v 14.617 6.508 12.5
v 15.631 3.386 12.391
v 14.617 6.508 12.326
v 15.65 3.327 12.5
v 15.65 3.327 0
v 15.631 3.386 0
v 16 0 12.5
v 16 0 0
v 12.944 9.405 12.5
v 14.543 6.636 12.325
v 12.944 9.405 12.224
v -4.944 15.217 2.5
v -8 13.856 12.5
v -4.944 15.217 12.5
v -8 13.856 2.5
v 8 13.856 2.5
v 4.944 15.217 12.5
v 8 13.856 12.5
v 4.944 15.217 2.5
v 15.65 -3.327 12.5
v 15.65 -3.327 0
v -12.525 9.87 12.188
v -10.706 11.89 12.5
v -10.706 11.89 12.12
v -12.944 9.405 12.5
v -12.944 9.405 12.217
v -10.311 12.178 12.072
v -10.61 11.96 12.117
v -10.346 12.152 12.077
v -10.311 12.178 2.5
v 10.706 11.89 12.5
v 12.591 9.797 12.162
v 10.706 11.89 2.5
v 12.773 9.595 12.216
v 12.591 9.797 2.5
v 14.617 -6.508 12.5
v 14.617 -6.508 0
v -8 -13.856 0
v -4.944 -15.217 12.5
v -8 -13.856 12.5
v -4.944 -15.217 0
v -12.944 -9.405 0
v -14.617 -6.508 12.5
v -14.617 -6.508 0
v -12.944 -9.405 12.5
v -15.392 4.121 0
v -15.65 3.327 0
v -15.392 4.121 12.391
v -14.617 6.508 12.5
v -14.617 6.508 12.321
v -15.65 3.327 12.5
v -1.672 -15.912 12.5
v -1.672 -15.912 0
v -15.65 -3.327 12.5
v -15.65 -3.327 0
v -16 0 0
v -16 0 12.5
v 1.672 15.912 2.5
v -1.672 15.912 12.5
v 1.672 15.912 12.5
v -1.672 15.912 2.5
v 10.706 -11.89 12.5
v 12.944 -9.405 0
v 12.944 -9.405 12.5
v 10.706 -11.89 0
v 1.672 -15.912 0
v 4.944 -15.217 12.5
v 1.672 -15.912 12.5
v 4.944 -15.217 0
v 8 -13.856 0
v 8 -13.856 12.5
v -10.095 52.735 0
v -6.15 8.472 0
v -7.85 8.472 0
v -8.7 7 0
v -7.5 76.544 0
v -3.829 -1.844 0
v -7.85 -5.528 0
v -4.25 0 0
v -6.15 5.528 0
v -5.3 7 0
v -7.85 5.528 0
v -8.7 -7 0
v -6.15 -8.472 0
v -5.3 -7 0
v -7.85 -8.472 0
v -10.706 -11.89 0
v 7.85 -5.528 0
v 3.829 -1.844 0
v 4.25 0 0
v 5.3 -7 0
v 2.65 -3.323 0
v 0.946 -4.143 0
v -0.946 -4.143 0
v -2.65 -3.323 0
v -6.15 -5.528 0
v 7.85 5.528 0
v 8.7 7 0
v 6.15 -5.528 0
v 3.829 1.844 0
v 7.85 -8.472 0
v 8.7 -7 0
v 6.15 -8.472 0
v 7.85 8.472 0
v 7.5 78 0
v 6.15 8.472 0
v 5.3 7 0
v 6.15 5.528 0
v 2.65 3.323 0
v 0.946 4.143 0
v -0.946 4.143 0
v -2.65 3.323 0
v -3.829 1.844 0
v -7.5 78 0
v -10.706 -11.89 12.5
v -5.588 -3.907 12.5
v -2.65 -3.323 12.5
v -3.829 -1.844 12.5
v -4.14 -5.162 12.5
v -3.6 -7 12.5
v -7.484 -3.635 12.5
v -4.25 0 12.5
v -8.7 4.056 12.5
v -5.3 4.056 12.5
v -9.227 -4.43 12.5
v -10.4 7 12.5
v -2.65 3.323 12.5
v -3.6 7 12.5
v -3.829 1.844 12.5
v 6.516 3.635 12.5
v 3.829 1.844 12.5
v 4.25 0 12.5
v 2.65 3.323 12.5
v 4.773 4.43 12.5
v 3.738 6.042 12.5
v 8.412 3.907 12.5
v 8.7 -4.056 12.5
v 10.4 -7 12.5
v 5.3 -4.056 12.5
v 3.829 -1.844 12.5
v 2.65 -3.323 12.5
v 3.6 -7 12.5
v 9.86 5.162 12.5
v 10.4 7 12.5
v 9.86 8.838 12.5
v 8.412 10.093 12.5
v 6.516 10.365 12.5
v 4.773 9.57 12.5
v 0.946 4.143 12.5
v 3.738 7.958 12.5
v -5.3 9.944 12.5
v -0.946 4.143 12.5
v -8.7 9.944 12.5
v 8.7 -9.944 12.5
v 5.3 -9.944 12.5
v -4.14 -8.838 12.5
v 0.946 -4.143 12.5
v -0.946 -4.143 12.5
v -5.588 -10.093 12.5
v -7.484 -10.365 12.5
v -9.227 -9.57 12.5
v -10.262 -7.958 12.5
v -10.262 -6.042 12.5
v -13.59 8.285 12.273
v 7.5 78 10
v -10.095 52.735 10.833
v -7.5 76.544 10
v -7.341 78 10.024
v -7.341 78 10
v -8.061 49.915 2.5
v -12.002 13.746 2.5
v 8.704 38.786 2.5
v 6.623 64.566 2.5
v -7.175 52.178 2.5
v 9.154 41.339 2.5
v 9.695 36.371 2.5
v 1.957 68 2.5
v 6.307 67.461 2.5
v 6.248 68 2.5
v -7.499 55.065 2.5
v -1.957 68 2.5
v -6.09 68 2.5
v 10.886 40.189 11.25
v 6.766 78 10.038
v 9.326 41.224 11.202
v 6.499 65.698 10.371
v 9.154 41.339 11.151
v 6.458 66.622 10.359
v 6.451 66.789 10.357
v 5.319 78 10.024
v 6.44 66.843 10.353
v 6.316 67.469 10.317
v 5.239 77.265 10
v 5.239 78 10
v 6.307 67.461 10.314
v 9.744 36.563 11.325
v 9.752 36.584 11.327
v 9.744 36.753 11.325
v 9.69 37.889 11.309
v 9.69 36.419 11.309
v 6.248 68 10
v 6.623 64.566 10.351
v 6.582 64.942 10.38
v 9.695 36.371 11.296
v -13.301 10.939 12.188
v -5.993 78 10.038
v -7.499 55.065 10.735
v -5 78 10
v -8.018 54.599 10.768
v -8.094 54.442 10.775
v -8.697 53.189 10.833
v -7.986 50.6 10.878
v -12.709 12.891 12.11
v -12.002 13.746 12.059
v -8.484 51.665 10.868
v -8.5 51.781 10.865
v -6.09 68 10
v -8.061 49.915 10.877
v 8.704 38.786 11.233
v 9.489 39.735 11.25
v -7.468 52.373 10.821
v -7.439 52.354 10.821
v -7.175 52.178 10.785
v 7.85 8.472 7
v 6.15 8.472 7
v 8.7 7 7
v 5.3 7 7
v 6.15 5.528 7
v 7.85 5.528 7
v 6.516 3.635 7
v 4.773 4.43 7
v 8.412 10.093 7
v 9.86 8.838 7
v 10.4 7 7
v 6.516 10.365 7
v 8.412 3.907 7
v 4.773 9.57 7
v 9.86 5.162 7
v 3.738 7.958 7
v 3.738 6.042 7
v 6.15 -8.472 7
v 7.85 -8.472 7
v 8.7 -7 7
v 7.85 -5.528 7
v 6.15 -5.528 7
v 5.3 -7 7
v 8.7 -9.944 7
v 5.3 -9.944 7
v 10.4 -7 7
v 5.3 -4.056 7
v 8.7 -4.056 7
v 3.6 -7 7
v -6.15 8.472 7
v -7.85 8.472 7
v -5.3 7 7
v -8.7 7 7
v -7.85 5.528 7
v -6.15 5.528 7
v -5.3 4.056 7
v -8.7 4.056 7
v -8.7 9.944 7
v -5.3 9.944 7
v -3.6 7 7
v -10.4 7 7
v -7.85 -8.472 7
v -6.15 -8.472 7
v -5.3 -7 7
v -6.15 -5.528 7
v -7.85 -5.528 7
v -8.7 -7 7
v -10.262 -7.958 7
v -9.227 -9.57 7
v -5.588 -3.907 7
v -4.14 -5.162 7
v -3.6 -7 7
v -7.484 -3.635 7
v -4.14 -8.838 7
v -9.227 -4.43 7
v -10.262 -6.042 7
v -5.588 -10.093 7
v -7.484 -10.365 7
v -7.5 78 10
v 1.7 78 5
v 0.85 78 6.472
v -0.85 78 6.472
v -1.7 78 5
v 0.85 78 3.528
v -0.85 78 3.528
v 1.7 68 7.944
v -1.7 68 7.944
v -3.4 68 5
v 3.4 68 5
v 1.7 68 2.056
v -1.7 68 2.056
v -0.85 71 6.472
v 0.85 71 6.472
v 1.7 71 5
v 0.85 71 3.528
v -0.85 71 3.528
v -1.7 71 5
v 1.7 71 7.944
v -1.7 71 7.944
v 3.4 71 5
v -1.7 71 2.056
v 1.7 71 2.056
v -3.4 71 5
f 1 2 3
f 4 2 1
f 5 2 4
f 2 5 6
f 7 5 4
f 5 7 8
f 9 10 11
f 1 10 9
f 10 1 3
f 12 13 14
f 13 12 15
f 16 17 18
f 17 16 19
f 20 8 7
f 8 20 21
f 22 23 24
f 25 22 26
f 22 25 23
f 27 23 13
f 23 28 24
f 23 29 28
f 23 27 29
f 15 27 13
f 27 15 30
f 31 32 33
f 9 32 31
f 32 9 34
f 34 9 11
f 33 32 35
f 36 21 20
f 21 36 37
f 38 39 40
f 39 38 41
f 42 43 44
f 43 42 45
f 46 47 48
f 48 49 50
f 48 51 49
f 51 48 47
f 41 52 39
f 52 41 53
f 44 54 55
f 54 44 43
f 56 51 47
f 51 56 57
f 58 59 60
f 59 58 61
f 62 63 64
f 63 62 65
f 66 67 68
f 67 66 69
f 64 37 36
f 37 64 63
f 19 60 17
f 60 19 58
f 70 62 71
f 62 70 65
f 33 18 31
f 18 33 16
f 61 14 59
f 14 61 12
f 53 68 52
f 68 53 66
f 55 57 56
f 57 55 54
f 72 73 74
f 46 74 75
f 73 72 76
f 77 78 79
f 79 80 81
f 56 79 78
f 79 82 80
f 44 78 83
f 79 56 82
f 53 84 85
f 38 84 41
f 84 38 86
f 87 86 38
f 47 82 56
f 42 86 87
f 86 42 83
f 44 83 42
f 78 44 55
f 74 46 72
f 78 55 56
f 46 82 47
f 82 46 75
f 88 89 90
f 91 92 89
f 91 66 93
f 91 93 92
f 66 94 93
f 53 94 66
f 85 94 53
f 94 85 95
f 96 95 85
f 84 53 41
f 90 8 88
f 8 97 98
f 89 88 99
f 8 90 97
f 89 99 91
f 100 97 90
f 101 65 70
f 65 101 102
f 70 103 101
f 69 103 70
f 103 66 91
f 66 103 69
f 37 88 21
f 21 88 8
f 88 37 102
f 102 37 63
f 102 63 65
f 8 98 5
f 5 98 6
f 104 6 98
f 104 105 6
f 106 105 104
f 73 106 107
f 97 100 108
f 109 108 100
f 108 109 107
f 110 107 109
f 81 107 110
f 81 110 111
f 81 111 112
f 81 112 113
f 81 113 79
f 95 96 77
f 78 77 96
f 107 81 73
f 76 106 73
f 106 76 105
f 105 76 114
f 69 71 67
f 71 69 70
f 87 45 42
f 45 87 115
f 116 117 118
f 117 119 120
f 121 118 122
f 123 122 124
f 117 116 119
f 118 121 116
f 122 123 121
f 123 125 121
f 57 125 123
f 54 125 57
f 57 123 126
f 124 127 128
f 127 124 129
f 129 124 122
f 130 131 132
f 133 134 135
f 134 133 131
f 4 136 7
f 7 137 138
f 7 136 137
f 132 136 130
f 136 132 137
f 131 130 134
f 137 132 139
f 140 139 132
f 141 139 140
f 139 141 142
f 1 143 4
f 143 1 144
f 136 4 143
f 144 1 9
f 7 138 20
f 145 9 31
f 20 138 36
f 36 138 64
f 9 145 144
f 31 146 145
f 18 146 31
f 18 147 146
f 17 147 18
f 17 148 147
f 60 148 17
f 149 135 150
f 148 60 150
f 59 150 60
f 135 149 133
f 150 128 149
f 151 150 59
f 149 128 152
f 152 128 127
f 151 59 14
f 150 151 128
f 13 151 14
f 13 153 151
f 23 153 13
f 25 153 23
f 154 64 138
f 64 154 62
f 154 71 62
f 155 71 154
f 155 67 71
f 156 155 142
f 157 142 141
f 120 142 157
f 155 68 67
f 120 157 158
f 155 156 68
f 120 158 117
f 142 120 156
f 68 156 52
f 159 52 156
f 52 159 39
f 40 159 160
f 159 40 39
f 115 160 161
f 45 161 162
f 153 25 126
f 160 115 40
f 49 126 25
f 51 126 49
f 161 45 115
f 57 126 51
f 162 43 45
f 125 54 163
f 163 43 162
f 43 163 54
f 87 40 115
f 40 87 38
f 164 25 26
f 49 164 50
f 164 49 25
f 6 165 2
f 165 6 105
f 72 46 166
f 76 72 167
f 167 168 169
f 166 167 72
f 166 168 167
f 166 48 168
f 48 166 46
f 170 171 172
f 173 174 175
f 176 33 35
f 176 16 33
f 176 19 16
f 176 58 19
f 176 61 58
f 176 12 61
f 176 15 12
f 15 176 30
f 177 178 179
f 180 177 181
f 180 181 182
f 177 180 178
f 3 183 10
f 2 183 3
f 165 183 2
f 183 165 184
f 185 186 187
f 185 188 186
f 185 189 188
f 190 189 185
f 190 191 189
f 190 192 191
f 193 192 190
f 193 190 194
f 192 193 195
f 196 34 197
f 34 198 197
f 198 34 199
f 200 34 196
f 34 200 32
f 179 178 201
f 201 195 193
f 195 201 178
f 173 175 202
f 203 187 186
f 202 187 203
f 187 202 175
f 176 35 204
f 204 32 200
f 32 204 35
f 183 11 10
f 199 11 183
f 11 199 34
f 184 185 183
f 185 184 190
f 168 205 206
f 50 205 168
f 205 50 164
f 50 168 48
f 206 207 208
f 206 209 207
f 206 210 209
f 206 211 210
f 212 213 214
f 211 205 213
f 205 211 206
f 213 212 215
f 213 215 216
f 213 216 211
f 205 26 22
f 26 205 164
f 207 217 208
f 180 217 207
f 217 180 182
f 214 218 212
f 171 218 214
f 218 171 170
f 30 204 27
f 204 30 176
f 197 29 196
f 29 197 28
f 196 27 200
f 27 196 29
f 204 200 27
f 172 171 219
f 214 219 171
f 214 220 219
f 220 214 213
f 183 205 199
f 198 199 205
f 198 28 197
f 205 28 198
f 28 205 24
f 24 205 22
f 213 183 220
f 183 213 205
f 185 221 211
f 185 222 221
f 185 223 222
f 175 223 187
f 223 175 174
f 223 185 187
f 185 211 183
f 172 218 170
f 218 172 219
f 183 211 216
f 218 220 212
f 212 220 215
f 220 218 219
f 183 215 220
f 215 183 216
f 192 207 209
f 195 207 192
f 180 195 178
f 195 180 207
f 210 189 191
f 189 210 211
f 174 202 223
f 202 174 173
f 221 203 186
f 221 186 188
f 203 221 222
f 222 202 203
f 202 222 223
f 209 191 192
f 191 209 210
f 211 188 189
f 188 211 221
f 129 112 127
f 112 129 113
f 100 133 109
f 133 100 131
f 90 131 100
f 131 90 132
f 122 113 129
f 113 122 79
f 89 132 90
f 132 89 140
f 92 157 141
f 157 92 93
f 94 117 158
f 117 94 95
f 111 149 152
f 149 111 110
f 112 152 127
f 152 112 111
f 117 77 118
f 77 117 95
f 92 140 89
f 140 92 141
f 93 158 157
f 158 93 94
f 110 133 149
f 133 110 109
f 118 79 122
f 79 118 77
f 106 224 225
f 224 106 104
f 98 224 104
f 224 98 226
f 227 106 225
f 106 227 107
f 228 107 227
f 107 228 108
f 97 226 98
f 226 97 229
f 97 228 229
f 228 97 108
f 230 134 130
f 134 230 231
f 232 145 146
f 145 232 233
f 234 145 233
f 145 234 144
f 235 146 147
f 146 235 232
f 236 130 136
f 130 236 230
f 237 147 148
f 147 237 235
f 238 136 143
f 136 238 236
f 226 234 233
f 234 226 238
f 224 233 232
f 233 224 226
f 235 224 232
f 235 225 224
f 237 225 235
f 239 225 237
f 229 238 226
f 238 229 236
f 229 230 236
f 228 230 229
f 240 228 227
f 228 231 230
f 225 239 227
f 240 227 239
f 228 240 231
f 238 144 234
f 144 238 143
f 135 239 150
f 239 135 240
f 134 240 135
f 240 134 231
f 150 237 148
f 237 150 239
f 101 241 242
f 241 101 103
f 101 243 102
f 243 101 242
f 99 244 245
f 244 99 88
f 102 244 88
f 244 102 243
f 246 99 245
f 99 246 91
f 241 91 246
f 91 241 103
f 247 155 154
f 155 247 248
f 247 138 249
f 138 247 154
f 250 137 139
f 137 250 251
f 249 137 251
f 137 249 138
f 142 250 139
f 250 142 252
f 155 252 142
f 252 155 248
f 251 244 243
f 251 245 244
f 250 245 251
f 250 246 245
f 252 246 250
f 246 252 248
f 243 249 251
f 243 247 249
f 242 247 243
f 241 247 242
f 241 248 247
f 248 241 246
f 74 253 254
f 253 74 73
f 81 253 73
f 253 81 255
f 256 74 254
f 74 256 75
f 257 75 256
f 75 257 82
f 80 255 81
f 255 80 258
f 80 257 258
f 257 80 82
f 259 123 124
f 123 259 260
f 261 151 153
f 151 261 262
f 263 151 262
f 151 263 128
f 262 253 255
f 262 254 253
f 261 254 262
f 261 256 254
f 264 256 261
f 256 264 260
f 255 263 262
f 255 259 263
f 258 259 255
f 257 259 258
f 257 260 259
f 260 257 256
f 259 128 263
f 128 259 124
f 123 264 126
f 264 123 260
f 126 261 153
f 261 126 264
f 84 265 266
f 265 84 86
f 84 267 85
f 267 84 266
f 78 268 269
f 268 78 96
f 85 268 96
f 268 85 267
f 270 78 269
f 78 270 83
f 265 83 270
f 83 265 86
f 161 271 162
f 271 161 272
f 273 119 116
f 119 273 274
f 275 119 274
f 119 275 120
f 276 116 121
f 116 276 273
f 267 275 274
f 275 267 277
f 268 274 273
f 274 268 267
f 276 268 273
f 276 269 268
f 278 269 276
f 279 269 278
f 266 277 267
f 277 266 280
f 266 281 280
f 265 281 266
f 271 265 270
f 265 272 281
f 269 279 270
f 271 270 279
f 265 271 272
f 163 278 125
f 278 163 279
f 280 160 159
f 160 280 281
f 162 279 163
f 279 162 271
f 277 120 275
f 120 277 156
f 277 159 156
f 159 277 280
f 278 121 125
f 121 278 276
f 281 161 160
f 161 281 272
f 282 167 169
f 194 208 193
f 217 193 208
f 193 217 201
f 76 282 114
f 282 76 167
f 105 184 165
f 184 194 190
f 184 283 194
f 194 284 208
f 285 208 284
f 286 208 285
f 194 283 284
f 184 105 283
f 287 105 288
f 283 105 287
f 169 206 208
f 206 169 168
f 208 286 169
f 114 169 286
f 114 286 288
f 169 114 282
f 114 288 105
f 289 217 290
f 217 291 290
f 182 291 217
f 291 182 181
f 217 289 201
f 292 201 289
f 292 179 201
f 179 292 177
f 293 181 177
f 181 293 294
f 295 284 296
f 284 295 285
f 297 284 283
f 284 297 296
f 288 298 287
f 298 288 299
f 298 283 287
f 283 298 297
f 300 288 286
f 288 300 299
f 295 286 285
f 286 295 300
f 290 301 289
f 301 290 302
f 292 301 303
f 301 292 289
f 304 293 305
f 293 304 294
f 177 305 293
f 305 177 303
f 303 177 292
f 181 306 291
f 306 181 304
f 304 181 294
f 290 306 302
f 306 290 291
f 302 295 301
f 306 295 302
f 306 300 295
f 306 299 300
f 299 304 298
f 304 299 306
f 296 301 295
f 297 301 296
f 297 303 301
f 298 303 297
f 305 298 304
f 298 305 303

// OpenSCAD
// file: shapes.scad
// 2D basic shapes
module inverseQuarterCircle(r) {
    difference() {
        square([2*r,2*r]);
        translate([r,r])circle(r=r);
        translate([r,0])square([r,2*r]);
        translate([0,r])square([2*r,r]);
    }
}


module catenary(length=100, width=5, a = 25, step=1) {
    function f(x) = width-(a*cosh(x/length)-a);
    for (i = [-length/2 + step : step : length/2]) {
        //echo("i = ", i, " f(i) = ", f(i));
        polygon([[i-step,0],[i,0],[i,f(i)],[i-step,f(i-step)]]);
    }
}

// 3D basic shapes

module roundedCube(size = [10,10,10],radius=1) {
    hull() {
        // bottom
        translate([size[0]-radius,size[1]-radius,radius])sphere(r=radius,center=true);
        translate([size[0]-radius,radius,radius])sphere(r=radius,center=true);
        translate([radius,size[1]-radius,radius])sphere(r=radius,center=true);
        translate([radius,radius,radius])sphere(r=radius,center=true);
        // top
        translate([size[0]-radius,size[1]-radius,size[2]-radius])sphere(r=radius,center=true);
        translate([size[0]-radius,radius,size[2]-radius])sphere(r=radius,center=true);
        translate([radius,size[1]-radius,size[2]-radius])sphere(r=radius,center=true);
        translate([radius,radius,size[2]-radius])sphere(r=radius,center=true);

    }
}

module roundedCylinder(d, h,rr=1, fn=$fn) {
    translate([0,0,rr])minkowski() {
        cylinder(d=d-2*rr, h=h-2*rr, $fn=fn);
        sphere(r=rr, center = true);
    }
}

module roundedBox(size = [1,1,1],radius=1) {
    hull() {
        translate([size[0]-radius,size[1]-radius,size[2]/2])cylinder(r=radius,h=size[2],center=true);
        translate([size[0]-radius,radius,size[2]/2])cylinder(r=radius,h=size[2],center=true);
        translate([radius,size[1]-radius,size[2]/2])cylinder(r=radius,h=size[2],center=true);
        translate([radius,radius,size[2]/2])cylinder(r=radius,h=size[2],center=true);
    }
}
// file: configuration.scad
print_layer_height = 0.25;
// Using a 623ZZ bearing
bearing_od = 10;
bearing_id = 3;
bearing_h = 4;

m2_dia = 2.4;
m2_nut_dia = 4.5;
m2_nut_slot = 3.9;
m2_nut_height = 2;

m3_dia = 3.4;
m3_nut_dia = 6.8;
m3_nut_slot = 5.8;
m3_nut_height = 3;

m4_dia = 4.5;
m4_nut_dia = 9;
m4_nut_height = 4;

e = 2.718281828;
pi = 3.1415926536;

function cosh(x) = (1 + pow(e, -2 * x)) / (2 * pow(e, -x));

function degtorad(x) = x*pi/180;
// main file
include <configuration.scad>
include <shapes.scad>

wall_thickness = 2.5;

module mountHoles(depth = 10) {
    difference() {
        children();
        // M8 hole
        cylinder(d = 8.5, h = depth);
        // M3 holes * nut slots
        translate([7,7,0])cylinder(d=m3_dia, h = depth);
        translate([7,7,7])cylinder(d=m3_nut_dia, h = depth);
        translate([7,-7,0])cylinder(d=m3_dia, h = depth);
        translate([7,-7,7])cylinder(d=m3_nut_dia, h = depth, $fn=6);
        translate([-7,7,0])cylinder(d=m3_dia, h = depth);
        translate([-7,7,7])cylinder(d=m3_nut_dia, h = depth, $fn=6);
        translate([-7,-7,0])cylinder(d=m3_dia, h = depth);
        translate([-7,-7,7])cylinder(d=m3_nut_dia, h = depth);

    }
}

module deltaArmBase(height_l = 6.5, height_h = 12.5, length = 90, base_dia = 32, end_dia=15) {
    support0_dx = (end_dia/2 + 7*base_dia/2)/8;
    support0_h = (7*height_h + height_l)/8;
    support0_dy = length/8;
    support1_dx = (end_dia/2 + base_dia/2)/2;
    support1_h = (height_h + height_l)/2;
    support1_dy = length/2;
    support2_dx = (2*end_dia/2 + base_dia/2)/3;
    support2_h = (height_h + 2*height_l)/3;
    support2_dy = 2*length/3;
    support3_dx = (6*end_dia/2 + base_dia/2)/7;
    support3_h = (height_h + 7*height_l)/8;
    support3_dy = 6*length/7;

    cylinder(d = base_dia, h = height_h);
    // bottom
    hull() {
        translate([end_dia/2 - wall_thickness/2, length, 0])cylinder(d=wall_thickness, h=wall_thickness);
        translate([base_dia/2 - wall_thickness/2, 0, 0])cylinder(d=wall_thickness, h=wall_thickness);
        translate([-end_dia/2 + wall_thickness/2, length, 0])cylinder(d=wall_thickness, h=wall_thickness);
        translate([-base_dia/2 + wall_thickness/2, 0, 0])cylinder(d=wall_thickness, h=wall_thickness);
    }
    // side
    hull() {
        translate([end_dia/2 - wall_thickness/2, length, 0])cylinder(d=wall_thickness, h=height_l);
        translate([base_dia/2 - wall_thickness/2, 0, 0])cylinder(d=wall_thickness, h=height_h);
    }
    // side
    hull() {
        translate([-end_dia/2 + wall_thickness/2, length, 0])cylinder(d=wall_thickness, h=height_l);
        translate([-base_dia/2 + wall_thickness/2, 0, 0])cylinder(d=wall_thickness, h=height_h);
    }
    // internal support
    hull() {
        translate([support1_dx - wall_thickness/2, support1_dy, 0])cylinder(d=wall_thickness, h=support1_h);
        translate([-support0_dx + wall_thickness/2, support0_dy, 0])cylinder(d=wall_thickness, h=support0_h);
    }
    // internal support
    hull() {
        translate([support1_dx - wall_thickness/2, support1_dy, 0])cylinder(d=wall_thickness, h=support1_h);
        translate([-support2_dx + wall_thickness/2, support2_dy, 0])cylinder(d=wall_thickness, h=support2_h);
    }
    // internal support
    hull() {
        translate([-support2_dx + wall_thickness/2, support2_dy, 0])cylinder(d=wall_thickness, h=support2_h);
        translate([support3_dx - wall_thickness/2, support3_dy, 0])cylinder(d=wall_thickness, h=support3_h);
    }

}


module deltaArmBearingMount(length = 90) {
    height_h = 12.5;
    nut_depth = 5;
    screw_dist = 7;
    mount_dia = bearing_od + 2*wall_thickness;
   difference() {
        mountHoles(height_h)deltaArmBase(height_l = 6.5, height_h = height_h, length);
        // Make space for bearing mount
        translate([-10, length, 0])cube([2*mount_dia,10,height_l + 1]);
        translate([0,length,0])cylinder(d = bearing_od, h = height_l);

        // M2 bolts
        translate([mount_dia/2,length,height_l/2])rotate([90,0,0])cylinder(d=m2_dia, h=bearing_cap_flange);
        translate([-mount_dia/2,length,height_l/2])rotate([90,0,0])cylinder(d=m2_dia, h=bearing_cap_flange);
        // M2 nuts
        translate([mount_dia/2,length-bearing_cap_flange,height_l/2])rotate([90,0,0])cylinder(d=m2_nut_dia, h=m2_nut_height, $fn=6);
        translate([-mount_dia/2,length-bearing_cap_flange,height_l/2])rotate([90,0,0])cylinder(d=m2_nut_dia, h=m2_nut_height, $fn=6);
    }
    // add bearing mount
    translate([0, length, 0])bearingMount(false, bearing_cap_flange);
}


module deltaArmAlt(length = 90) {
    opening = bearing_od - 2;
    mount_dia = bearing_od + 2*wall_thickness;
    height_h = 12.5;
    height_l = bearing_h + wall_thickness;
    nut_depth = 5;
    screw_dist = 7;
    difference() {
        union() {
            mountHoles(height_h)deltaArmBase(height_h = 12.5, length = length, height_l = height_l);
            translate([0,length,0])cylinder(d=mount_dia, h=height_l);
         }
         // Opening for bearing
        translate([0,length,height_l - bearing_h])cylinder(d=bearing_od + 0.5, h=bearing_h + 1);
         // opening for axis
        translate([0,length,0])cylinder(d=opening, h=height_l);
        translate([0,90,0]) {
            translate([3,-11,0])cylinder(d=m3_dia, h=20, center=true);
            translate([-3,-11,0])cylinder(d=m3_dia, h=20, center=true);

         }
    }
 
}

module deltaArmBearingBlock() {
    height_h = 12.5;
    axis_distance = 90 - 12;
    height_l = 10;
    end_dia = 15;
    difference() {
        union() {
            mountHoles(height_h)deltaArmBase(height_l = height_l, height_h = height_h, length = axis_distance, base_dia = 32, end_dia=end_dia);
            translate([-end_dia/2,axis_distance-10,0])cube([end_dia, 10, height_l]);
        }
        // Slice top off
        translate([-end_dia/2,axis_distance,0])cube([end_dia, wall_thickness, height_l+1]);
        // screw hole
        translate([0,axis_distance-10,height_l/2])rotate([-90,0,0])cylinder(d=m3_dia, h=10);
        // nut hole
        translate([0,axis_distance-10,height_l/2])rotate([-90,0,0])cylinder(d=m3_nut_dia, h=m3_nut_height, $fn=6);
    }
}

//$fa=3;
//$fs=0.2;
deltaArmBearingBlock();
